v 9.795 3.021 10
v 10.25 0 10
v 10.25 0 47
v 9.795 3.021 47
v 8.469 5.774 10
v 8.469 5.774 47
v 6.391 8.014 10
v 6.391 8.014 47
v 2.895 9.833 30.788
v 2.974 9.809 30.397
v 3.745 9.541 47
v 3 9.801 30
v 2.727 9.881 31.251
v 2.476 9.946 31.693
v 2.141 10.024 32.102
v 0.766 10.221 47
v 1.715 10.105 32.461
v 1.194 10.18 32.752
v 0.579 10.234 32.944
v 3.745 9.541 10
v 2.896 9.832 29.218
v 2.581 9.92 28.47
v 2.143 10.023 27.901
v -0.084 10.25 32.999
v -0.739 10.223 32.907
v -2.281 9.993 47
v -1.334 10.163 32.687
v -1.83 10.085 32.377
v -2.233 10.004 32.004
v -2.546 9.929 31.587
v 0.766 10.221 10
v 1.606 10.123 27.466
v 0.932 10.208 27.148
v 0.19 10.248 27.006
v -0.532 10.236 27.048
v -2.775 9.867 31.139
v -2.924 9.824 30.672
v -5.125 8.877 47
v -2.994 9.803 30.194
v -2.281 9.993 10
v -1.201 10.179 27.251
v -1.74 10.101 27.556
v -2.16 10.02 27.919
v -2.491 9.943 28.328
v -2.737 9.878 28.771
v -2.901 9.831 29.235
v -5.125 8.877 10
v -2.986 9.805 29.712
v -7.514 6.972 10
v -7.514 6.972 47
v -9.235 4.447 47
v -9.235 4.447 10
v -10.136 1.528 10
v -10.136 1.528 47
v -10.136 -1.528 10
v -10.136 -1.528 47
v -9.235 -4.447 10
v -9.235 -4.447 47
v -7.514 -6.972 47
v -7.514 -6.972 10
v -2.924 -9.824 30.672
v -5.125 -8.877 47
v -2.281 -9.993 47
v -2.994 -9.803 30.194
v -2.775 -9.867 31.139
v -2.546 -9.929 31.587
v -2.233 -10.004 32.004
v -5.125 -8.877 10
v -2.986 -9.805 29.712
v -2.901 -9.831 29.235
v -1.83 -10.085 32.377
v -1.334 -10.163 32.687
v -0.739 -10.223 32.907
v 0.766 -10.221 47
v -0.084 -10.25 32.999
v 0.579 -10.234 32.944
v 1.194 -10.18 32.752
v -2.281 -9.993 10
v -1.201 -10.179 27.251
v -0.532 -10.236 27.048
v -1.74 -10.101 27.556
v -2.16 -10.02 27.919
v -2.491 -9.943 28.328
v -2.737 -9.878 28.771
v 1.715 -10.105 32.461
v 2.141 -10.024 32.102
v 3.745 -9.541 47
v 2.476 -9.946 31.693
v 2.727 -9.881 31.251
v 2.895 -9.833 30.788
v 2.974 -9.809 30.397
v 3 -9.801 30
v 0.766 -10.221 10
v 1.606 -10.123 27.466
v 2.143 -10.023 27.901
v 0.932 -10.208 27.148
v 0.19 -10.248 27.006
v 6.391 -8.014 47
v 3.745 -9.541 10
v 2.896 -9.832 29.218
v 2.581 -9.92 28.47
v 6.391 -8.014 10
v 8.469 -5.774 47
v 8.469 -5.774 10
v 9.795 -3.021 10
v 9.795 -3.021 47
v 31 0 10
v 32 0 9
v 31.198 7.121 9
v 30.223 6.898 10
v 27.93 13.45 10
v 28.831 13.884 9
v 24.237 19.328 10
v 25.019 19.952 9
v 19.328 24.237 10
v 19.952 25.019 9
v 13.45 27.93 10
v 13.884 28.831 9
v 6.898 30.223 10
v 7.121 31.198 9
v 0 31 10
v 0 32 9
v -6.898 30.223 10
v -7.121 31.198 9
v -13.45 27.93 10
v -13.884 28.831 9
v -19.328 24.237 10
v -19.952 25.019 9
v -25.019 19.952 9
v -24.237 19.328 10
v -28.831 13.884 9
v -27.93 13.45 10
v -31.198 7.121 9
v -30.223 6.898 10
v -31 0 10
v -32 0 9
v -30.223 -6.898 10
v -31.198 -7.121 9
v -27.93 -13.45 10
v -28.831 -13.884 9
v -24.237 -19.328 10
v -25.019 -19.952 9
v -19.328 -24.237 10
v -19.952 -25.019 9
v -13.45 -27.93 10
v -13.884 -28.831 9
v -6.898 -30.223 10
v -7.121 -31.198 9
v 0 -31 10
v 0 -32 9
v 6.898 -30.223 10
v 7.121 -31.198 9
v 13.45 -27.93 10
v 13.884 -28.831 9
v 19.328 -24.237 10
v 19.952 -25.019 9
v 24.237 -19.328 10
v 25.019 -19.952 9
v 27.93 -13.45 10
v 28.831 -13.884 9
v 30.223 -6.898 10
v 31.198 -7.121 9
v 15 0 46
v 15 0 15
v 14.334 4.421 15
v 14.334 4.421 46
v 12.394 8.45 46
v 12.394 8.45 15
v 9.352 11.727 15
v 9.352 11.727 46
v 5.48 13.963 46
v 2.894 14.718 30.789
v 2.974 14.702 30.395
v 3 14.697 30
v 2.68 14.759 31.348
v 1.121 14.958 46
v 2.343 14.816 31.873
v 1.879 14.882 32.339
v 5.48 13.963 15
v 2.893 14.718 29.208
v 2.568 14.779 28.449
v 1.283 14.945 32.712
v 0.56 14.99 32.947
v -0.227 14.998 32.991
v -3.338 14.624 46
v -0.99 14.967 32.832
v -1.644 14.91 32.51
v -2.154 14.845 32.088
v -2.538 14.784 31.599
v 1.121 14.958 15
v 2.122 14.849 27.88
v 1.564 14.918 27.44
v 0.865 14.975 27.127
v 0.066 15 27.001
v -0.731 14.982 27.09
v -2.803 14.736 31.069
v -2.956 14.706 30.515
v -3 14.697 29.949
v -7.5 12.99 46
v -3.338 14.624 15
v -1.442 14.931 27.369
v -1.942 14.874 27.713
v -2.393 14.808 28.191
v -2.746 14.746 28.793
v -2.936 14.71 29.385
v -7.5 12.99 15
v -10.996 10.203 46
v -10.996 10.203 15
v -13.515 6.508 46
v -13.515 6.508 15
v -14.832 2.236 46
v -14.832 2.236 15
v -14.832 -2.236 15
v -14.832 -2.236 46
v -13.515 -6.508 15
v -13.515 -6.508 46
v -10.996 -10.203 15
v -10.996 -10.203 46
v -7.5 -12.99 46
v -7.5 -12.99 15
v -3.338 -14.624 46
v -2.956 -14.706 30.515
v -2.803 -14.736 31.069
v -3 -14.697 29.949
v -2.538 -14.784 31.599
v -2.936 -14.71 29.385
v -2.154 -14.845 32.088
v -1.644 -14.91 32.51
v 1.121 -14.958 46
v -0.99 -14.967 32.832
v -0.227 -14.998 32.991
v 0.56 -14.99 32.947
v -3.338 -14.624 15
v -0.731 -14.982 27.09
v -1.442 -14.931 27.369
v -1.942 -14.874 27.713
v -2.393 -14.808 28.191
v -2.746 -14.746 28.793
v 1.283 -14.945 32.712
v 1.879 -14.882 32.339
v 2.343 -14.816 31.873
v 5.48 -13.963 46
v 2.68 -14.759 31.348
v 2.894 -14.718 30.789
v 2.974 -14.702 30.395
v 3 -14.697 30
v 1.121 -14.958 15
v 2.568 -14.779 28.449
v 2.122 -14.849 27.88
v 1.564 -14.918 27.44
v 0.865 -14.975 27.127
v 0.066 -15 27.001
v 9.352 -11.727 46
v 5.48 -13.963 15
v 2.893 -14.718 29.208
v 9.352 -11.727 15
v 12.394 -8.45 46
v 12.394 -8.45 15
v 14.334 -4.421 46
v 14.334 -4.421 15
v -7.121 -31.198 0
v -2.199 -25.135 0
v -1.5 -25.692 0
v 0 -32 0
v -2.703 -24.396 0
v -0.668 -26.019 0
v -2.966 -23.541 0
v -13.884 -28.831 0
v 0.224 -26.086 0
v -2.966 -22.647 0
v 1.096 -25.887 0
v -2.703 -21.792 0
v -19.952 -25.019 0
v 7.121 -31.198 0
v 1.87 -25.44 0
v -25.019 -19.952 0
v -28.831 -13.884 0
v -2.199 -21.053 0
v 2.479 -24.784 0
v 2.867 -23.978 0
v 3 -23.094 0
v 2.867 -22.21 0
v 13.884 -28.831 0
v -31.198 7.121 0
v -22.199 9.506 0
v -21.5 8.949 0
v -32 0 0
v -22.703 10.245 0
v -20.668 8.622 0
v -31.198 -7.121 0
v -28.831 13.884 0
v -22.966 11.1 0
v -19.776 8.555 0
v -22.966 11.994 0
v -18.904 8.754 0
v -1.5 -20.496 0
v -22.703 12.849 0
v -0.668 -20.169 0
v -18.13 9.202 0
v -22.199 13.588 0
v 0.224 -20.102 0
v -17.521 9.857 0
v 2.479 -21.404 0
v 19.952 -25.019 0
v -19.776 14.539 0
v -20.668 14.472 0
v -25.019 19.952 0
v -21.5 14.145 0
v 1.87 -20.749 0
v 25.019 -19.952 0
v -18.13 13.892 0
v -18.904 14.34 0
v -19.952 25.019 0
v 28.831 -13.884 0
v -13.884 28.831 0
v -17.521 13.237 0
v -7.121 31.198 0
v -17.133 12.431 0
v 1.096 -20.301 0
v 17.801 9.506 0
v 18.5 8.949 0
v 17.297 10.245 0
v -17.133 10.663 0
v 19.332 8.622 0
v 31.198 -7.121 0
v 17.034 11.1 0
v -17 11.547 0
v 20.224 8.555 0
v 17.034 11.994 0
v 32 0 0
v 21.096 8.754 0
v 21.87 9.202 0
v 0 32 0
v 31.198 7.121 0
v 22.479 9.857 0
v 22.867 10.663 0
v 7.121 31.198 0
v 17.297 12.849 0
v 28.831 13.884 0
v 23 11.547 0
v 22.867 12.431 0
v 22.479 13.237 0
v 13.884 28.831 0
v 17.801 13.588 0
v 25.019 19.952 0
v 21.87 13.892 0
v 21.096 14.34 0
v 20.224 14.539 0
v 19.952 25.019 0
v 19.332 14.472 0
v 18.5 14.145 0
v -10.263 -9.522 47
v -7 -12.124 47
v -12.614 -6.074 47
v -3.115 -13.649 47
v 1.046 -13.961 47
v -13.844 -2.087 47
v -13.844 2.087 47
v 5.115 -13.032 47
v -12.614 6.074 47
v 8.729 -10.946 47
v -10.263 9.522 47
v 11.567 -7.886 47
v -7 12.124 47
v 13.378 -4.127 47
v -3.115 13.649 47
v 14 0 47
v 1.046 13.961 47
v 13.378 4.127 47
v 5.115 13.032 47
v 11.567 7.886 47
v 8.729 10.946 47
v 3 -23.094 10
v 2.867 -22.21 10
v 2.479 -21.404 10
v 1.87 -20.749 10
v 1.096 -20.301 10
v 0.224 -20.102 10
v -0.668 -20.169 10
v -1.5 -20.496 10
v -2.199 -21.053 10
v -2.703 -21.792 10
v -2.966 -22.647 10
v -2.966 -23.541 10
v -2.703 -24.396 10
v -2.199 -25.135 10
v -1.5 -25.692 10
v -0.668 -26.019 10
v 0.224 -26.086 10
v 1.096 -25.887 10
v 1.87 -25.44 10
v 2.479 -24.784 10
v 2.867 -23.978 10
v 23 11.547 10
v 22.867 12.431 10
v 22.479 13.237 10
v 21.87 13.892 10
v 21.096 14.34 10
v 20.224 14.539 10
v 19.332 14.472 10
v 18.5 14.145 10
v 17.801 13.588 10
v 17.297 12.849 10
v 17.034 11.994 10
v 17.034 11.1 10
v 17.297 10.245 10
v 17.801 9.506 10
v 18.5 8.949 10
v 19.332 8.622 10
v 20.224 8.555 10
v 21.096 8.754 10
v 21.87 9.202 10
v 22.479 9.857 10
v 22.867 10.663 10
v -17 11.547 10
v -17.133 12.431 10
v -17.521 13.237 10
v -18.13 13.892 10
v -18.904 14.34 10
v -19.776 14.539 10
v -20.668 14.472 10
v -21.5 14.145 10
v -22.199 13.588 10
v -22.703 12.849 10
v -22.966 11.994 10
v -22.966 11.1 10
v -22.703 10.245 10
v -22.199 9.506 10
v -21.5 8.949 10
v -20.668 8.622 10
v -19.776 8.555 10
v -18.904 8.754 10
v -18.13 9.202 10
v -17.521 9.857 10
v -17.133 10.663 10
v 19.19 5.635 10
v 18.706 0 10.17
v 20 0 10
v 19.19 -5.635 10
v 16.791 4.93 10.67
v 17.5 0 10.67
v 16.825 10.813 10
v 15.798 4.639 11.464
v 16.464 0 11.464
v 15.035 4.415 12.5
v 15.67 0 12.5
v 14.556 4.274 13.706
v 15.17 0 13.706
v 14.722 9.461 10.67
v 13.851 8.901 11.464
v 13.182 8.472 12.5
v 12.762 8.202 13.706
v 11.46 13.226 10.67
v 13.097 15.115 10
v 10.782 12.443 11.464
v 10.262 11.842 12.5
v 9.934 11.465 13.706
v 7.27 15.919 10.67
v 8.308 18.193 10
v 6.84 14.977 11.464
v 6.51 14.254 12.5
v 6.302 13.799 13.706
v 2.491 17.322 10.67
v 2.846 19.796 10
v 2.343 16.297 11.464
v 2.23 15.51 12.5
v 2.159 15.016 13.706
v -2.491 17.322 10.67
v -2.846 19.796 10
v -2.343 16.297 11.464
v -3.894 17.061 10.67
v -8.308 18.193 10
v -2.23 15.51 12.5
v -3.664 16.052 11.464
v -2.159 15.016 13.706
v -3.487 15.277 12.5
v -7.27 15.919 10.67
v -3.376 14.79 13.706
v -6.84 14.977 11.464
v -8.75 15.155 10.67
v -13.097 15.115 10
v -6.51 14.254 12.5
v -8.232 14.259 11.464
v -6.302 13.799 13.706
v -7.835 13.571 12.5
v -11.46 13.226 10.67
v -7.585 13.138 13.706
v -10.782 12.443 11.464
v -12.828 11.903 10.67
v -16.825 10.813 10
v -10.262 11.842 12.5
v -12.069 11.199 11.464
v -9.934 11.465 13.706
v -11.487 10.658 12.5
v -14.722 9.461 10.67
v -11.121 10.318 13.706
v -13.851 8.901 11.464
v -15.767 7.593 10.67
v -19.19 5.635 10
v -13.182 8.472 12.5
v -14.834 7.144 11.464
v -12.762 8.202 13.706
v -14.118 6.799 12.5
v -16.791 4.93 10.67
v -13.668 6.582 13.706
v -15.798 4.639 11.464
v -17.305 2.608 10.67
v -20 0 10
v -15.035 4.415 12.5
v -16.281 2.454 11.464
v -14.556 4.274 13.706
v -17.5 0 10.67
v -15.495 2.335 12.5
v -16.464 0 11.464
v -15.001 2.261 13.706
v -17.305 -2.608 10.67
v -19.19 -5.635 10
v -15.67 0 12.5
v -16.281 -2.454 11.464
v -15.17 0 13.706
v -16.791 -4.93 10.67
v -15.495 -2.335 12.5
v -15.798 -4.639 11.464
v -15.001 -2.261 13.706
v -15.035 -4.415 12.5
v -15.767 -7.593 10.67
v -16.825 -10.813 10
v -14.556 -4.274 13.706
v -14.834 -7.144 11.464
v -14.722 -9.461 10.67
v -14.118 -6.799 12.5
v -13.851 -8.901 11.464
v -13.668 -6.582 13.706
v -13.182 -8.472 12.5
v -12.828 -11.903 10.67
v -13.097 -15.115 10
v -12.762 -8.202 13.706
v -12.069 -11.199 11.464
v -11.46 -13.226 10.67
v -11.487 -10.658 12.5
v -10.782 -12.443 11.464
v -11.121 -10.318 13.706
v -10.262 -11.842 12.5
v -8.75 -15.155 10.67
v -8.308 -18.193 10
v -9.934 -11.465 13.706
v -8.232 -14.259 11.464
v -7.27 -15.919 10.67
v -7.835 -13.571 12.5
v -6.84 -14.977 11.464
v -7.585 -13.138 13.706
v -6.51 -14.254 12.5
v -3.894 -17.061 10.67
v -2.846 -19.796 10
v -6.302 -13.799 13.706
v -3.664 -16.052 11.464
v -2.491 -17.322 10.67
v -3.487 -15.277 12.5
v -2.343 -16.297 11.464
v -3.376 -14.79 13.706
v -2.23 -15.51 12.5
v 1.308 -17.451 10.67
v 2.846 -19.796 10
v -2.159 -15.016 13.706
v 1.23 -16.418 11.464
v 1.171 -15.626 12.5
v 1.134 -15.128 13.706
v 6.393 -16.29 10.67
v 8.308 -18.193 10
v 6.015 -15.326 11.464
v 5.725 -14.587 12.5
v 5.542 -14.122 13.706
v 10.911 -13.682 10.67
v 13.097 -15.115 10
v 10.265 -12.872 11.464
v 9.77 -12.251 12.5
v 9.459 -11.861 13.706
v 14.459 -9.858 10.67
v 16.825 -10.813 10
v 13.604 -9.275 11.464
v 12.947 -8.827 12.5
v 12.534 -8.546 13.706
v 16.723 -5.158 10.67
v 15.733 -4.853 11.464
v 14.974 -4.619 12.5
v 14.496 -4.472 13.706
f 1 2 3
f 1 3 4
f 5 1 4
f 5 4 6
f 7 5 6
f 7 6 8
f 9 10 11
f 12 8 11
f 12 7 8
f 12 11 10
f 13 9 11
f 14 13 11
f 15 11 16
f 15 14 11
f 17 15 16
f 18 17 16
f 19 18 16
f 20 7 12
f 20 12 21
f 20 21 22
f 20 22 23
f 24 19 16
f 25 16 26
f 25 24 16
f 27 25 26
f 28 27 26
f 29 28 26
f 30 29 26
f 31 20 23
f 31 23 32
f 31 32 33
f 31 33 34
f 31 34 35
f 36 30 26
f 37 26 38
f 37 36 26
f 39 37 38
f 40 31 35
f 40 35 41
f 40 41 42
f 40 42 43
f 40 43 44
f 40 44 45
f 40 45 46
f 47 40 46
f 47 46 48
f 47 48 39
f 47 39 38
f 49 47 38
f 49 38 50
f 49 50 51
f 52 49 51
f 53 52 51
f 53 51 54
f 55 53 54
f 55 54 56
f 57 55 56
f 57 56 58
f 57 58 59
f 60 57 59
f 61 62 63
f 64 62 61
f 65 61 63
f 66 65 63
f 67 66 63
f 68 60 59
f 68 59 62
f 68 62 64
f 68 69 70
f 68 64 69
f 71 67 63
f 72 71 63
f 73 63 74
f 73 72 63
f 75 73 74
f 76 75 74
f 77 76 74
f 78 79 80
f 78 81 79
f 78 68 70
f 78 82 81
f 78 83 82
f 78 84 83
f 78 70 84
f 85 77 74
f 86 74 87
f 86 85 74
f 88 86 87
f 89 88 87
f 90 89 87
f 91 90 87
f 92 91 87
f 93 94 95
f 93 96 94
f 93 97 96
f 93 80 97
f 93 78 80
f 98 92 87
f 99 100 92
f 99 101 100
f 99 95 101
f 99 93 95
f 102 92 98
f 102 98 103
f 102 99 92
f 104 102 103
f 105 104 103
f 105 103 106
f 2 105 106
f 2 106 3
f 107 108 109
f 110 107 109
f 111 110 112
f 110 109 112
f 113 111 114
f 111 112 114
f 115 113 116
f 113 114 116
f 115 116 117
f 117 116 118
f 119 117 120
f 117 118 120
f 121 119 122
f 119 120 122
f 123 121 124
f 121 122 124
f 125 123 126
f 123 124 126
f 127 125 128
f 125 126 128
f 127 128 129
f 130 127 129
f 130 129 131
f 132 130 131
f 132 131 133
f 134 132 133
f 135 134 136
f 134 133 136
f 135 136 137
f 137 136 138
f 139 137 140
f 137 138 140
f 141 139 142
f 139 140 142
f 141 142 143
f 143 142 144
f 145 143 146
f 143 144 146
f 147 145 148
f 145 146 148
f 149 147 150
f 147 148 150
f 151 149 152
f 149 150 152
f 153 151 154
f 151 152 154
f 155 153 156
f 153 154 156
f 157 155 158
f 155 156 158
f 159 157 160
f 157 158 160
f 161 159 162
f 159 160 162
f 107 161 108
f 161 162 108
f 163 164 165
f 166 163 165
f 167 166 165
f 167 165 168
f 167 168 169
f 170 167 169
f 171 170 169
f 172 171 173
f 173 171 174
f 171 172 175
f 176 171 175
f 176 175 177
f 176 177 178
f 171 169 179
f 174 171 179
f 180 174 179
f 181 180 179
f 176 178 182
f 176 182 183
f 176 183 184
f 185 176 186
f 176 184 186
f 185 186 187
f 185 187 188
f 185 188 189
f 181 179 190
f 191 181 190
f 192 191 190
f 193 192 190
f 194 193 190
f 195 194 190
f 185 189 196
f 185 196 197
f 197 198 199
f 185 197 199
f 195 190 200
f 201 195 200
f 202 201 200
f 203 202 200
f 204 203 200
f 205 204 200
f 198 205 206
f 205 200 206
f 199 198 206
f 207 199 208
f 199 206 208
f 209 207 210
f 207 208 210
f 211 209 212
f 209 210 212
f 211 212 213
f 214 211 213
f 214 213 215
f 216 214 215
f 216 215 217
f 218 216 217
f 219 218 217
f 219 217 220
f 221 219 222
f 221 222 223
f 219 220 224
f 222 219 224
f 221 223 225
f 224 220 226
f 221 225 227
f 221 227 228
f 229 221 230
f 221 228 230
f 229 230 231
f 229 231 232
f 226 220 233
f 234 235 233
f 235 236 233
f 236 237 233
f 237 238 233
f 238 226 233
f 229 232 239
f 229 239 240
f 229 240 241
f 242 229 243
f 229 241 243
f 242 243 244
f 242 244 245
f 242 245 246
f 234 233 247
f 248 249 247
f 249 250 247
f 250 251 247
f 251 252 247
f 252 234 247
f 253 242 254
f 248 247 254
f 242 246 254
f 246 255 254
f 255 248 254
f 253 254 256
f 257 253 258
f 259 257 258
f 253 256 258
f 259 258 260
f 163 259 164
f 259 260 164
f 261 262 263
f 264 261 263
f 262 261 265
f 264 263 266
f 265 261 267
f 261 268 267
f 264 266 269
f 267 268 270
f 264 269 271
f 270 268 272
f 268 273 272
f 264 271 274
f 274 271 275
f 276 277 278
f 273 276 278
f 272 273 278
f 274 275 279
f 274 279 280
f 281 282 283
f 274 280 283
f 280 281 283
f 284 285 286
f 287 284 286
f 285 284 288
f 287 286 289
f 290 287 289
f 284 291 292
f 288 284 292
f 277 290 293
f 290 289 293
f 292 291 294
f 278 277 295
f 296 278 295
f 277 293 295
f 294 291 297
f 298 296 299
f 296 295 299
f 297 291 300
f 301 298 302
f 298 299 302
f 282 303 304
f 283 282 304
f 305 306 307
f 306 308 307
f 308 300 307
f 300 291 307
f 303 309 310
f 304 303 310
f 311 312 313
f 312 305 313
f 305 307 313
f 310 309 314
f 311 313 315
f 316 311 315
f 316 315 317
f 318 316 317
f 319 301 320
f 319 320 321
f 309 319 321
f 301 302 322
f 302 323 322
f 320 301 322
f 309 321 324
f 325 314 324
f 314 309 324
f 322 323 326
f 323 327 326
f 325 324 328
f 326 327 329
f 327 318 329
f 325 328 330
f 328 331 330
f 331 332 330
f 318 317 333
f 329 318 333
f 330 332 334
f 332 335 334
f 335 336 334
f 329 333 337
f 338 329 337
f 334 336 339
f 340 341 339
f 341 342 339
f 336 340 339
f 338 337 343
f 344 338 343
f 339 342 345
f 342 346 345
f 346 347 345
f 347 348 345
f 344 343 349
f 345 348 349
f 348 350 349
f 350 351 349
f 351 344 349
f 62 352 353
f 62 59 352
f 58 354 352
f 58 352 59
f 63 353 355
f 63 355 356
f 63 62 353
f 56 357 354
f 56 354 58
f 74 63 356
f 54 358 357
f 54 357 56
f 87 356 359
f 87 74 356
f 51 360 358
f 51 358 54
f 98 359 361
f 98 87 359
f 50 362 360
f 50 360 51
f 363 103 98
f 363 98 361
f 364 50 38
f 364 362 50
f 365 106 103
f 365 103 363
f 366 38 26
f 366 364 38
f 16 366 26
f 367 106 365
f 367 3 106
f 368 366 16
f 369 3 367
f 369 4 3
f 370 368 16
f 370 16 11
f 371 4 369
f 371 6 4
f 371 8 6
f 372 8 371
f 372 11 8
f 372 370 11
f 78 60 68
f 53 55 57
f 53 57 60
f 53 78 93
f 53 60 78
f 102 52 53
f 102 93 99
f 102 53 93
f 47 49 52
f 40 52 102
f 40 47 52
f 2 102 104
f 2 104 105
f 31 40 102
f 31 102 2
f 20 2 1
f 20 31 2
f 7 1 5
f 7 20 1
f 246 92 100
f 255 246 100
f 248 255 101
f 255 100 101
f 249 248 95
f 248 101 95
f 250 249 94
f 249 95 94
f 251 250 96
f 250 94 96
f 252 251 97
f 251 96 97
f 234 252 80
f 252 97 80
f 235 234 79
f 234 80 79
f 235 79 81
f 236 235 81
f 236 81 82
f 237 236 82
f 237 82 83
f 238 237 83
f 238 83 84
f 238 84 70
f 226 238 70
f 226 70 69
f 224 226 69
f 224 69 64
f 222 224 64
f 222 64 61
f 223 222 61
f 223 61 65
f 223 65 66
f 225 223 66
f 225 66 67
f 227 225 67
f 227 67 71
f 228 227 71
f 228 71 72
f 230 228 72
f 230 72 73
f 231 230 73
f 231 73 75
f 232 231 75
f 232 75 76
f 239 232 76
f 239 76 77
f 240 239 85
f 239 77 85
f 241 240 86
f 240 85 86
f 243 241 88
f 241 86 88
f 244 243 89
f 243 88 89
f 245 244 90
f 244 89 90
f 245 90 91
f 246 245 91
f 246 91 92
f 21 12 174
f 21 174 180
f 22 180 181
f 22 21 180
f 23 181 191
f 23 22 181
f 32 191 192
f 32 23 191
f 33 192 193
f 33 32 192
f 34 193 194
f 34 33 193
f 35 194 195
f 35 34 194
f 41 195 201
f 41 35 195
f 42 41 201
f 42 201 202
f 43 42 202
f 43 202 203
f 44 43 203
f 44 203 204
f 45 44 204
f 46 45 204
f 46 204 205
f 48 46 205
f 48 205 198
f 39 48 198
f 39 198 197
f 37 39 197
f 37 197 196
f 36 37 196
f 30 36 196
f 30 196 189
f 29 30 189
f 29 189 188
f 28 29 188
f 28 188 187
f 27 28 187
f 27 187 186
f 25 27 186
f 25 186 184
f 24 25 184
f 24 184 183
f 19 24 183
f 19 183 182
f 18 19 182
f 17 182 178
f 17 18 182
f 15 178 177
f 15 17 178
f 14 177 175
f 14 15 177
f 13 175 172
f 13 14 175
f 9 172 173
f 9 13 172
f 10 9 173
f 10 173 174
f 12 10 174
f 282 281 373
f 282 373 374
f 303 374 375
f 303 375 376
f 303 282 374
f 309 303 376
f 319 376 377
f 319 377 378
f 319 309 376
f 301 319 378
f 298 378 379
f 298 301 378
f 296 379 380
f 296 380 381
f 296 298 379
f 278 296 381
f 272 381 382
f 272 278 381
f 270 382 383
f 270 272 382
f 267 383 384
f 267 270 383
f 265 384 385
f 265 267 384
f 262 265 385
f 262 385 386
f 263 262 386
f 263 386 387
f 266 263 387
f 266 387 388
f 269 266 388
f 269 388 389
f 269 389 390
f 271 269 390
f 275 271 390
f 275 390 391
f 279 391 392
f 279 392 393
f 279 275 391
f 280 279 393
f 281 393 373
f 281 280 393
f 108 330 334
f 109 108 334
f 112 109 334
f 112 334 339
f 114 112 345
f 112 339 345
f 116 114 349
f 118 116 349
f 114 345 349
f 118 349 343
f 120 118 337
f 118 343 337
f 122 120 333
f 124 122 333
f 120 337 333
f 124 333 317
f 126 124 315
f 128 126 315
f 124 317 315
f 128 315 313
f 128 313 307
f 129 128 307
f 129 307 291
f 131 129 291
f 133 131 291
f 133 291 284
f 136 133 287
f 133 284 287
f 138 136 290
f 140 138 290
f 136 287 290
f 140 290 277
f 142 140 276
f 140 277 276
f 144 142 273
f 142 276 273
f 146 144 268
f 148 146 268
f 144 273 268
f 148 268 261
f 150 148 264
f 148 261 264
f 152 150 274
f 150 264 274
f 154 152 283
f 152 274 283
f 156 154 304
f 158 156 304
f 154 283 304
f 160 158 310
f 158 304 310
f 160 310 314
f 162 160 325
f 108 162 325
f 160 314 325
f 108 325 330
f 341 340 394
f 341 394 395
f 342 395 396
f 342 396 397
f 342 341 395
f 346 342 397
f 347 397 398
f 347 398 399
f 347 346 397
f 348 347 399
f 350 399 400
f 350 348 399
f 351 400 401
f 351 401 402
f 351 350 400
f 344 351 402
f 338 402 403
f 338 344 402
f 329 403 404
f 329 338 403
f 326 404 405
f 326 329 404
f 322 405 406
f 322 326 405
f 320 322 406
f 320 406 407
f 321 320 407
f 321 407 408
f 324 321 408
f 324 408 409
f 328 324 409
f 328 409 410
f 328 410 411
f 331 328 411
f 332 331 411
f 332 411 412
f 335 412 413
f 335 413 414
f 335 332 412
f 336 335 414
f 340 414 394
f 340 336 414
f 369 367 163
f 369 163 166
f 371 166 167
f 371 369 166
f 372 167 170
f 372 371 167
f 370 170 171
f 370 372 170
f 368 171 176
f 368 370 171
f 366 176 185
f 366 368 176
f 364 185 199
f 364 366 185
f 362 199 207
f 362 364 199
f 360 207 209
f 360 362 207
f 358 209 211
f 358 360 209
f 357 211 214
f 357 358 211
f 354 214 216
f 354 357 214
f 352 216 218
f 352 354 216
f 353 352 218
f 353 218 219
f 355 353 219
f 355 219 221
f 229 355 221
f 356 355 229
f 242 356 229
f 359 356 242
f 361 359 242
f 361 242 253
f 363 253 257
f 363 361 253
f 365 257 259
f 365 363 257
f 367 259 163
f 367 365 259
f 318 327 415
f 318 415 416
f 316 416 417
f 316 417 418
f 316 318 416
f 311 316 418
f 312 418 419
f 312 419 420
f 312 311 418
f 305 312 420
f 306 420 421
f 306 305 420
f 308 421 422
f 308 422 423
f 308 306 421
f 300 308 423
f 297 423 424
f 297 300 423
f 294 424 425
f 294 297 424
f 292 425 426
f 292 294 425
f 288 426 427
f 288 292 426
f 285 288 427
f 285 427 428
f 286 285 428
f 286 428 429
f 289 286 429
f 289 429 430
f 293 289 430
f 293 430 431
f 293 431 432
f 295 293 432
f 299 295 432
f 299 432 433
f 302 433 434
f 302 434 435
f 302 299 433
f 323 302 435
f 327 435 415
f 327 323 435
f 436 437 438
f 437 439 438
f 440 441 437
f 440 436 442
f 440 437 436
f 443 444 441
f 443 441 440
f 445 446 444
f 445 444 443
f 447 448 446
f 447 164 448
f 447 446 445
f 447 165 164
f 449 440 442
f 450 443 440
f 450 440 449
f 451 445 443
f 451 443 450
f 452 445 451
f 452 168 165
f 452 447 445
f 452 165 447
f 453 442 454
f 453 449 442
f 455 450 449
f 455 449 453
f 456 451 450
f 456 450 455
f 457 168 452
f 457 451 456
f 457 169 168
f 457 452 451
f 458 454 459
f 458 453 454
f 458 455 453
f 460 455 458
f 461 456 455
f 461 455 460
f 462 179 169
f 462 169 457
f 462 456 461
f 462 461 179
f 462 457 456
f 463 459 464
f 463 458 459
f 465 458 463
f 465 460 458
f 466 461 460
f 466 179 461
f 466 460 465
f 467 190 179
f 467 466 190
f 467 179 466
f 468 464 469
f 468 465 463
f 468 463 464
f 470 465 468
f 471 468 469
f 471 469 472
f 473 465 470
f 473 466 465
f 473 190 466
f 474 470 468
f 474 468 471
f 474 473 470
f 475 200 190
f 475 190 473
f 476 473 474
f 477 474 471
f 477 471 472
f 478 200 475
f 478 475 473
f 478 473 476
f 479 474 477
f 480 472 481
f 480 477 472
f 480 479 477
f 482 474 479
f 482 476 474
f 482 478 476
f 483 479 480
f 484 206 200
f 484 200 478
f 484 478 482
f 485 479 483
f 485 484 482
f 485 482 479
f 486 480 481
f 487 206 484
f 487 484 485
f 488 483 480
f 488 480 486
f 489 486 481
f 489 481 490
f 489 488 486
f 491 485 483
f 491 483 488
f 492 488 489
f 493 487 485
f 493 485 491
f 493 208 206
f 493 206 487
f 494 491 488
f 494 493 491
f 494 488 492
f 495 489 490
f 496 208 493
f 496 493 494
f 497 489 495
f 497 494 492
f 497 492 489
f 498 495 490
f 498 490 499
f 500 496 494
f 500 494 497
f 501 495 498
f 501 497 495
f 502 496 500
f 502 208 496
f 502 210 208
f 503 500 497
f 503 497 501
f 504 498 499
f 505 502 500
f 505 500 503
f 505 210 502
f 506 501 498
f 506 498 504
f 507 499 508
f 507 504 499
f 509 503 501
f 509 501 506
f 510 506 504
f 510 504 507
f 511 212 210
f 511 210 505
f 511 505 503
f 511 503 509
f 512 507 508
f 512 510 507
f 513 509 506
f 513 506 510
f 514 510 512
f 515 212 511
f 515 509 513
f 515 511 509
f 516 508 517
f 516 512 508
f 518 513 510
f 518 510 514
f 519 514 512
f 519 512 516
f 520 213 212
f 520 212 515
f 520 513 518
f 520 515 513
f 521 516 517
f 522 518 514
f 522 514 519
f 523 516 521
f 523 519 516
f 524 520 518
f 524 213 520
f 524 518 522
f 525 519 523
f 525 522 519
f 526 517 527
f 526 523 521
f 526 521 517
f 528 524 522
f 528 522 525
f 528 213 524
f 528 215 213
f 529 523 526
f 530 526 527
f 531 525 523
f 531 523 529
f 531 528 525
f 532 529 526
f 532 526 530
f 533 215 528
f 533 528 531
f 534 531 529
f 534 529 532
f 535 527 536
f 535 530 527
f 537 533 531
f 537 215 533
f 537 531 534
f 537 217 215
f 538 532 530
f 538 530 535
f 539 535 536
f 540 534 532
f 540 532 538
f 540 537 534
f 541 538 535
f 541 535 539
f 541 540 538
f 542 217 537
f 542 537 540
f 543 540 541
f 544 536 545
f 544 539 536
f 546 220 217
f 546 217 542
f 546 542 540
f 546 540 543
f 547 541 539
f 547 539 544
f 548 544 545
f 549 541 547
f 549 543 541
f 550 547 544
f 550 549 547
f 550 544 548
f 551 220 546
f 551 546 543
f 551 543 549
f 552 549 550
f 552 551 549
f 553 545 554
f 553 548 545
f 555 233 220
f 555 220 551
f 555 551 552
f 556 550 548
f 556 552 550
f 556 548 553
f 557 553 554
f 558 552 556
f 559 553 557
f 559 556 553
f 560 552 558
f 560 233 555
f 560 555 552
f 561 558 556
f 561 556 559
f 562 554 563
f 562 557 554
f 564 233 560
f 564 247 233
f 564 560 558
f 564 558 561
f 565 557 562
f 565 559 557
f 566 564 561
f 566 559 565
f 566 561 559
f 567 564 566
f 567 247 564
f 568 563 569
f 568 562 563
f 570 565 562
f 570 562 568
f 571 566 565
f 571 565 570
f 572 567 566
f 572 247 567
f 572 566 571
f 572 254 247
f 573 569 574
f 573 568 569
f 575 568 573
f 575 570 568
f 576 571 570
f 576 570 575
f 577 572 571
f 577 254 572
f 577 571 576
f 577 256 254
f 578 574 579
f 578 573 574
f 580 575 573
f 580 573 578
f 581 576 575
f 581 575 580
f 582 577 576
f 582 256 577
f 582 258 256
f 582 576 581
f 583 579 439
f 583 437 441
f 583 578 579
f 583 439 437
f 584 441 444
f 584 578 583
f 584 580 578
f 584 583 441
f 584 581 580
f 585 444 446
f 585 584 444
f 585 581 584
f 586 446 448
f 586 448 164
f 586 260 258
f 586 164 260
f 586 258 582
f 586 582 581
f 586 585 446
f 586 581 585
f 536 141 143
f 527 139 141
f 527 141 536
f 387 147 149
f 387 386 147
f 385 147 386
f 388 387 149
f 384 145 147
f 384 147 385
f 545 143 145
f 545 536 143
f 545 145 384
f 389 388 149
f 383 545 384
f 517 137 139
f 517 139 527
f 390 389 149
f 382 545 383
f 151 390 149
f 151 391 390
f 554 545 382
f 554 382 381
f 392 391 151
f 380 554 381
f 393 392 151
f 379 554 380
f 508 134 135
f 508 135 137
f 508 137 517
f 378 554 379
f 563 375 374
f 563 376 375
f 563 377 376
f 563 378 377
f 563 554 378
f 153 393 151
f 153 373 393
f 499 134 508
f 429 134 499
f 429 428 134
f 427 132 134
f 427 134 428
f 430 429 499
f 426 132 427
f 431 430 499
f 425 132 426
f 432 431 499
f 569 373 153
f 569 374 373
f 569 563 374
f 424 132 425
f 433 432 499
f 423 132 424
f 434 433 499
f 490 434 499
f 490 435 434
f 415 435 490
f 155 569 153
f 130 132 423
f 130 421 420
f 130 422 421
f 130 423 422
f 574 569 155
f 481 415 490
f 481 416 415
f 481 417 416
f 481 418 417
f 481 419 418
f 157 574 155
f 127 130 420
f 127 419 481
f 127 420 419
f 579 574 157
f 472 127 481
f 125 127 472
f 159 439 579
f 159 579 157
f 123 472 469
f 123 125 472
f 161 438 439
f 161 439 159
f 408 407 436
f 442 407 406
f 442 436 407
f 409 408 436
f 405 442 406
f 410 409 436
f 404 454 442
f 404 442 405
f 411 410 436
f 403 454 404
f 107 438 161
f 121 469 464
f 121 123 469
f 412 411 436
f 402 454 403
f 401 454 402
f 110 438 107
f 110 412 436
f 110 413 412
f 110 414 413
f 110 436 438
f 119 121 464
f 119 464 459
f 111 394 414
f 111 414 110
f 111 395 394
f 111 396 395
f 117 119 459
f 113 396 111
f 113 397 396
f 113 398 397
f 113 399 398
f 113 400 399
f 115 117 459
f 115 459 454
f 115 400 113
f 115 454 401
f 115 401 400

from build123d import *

# Parameters (mm, degrees)
SKETCH1_R               = 32
SKETCH1_R_2             = 3
BOSS_EXTRUDE1_DEPTH     = 10
SKETCH2_R               = 15
SKETCH2_R_2             = 10.25
BOSS_EXTRUDE2_DEPTH     = 37
SKETCH3_R               = 3
CUT_EXTRUDE1_DEPTH      = 33
CUT_EXTRUDE1_DEPTH_BACK = 33
FILLET_1_R              = 5
CHAMFER_1_SIZE          = 1


with BuildPart() as part:
    # Sketch1 → Boss-Extrude1 (new body)
    with BuildSketch(Plane.XY):
        Circle(SKETCH1_R)
        with Locations((20, 11.547005384)):
            Circle(SKETCH1_R_2, mode=Mode.SUBTRACT)
        with Locations((0, -23.094010768)):
            Circle(SKETCH1_R_2, mode=Mode.SUBTRACT)
        with Locations((-20, 11.547005384)):
            Circle(SKETCH1_R_2, mode=Mode.SUBTRACT)
    extrude(amount=BOSS_EXTRUDE1_DEPTH)

    # Sketch2 → Boss-Extrude2 (add)
    with BuildSketch(Plane.XY.offset(10)):
        Circle(SKETCH2_R)
        Circle(SKETCH2_R_2, mode=Mode.SUBTRACT)
    extrude(amount=BOSS_EXTRUDE2_DEPTH)

    # Sketch3 → Cut-Extrude1 (cut, two sides)
    with BuildSketch(Plane(origin=(0, 0, 0), x_dir=(1, 0, 0), z_dir=(0, 1, 0))) as cut_extrude1_sk:
        with Locations((0, -30)):
            Circle(SKETCH3_R)
    extrude(amount=CUT_EXTRUDE1_DEPTH, mode=Mode.SUBTRACT)
    extrude(cut_extrude1_sk.sketch, amount=-CUT_EXTRUDE1_DEPTH_BACK, mode=Mode.SUBTRACT)

    # 圆角1
    fillet_1_edges = [part.edges().sort_by_distance(p)[0] for p in [
        (-15, 0, 10),
    ]]
    fillet(fillet_1_edges, radius=FILLET_1_R)

    # 倒角1
    chamfer_1_edges = [part.edges().sort_by_distance(p)[0] for p in [
        (-15, 0, 47),
        (-32, 0, 10),
    ]]
    chamfer(chamfer_1_edges, length=CHAMFER_1_SIZE)


solid = part.part
